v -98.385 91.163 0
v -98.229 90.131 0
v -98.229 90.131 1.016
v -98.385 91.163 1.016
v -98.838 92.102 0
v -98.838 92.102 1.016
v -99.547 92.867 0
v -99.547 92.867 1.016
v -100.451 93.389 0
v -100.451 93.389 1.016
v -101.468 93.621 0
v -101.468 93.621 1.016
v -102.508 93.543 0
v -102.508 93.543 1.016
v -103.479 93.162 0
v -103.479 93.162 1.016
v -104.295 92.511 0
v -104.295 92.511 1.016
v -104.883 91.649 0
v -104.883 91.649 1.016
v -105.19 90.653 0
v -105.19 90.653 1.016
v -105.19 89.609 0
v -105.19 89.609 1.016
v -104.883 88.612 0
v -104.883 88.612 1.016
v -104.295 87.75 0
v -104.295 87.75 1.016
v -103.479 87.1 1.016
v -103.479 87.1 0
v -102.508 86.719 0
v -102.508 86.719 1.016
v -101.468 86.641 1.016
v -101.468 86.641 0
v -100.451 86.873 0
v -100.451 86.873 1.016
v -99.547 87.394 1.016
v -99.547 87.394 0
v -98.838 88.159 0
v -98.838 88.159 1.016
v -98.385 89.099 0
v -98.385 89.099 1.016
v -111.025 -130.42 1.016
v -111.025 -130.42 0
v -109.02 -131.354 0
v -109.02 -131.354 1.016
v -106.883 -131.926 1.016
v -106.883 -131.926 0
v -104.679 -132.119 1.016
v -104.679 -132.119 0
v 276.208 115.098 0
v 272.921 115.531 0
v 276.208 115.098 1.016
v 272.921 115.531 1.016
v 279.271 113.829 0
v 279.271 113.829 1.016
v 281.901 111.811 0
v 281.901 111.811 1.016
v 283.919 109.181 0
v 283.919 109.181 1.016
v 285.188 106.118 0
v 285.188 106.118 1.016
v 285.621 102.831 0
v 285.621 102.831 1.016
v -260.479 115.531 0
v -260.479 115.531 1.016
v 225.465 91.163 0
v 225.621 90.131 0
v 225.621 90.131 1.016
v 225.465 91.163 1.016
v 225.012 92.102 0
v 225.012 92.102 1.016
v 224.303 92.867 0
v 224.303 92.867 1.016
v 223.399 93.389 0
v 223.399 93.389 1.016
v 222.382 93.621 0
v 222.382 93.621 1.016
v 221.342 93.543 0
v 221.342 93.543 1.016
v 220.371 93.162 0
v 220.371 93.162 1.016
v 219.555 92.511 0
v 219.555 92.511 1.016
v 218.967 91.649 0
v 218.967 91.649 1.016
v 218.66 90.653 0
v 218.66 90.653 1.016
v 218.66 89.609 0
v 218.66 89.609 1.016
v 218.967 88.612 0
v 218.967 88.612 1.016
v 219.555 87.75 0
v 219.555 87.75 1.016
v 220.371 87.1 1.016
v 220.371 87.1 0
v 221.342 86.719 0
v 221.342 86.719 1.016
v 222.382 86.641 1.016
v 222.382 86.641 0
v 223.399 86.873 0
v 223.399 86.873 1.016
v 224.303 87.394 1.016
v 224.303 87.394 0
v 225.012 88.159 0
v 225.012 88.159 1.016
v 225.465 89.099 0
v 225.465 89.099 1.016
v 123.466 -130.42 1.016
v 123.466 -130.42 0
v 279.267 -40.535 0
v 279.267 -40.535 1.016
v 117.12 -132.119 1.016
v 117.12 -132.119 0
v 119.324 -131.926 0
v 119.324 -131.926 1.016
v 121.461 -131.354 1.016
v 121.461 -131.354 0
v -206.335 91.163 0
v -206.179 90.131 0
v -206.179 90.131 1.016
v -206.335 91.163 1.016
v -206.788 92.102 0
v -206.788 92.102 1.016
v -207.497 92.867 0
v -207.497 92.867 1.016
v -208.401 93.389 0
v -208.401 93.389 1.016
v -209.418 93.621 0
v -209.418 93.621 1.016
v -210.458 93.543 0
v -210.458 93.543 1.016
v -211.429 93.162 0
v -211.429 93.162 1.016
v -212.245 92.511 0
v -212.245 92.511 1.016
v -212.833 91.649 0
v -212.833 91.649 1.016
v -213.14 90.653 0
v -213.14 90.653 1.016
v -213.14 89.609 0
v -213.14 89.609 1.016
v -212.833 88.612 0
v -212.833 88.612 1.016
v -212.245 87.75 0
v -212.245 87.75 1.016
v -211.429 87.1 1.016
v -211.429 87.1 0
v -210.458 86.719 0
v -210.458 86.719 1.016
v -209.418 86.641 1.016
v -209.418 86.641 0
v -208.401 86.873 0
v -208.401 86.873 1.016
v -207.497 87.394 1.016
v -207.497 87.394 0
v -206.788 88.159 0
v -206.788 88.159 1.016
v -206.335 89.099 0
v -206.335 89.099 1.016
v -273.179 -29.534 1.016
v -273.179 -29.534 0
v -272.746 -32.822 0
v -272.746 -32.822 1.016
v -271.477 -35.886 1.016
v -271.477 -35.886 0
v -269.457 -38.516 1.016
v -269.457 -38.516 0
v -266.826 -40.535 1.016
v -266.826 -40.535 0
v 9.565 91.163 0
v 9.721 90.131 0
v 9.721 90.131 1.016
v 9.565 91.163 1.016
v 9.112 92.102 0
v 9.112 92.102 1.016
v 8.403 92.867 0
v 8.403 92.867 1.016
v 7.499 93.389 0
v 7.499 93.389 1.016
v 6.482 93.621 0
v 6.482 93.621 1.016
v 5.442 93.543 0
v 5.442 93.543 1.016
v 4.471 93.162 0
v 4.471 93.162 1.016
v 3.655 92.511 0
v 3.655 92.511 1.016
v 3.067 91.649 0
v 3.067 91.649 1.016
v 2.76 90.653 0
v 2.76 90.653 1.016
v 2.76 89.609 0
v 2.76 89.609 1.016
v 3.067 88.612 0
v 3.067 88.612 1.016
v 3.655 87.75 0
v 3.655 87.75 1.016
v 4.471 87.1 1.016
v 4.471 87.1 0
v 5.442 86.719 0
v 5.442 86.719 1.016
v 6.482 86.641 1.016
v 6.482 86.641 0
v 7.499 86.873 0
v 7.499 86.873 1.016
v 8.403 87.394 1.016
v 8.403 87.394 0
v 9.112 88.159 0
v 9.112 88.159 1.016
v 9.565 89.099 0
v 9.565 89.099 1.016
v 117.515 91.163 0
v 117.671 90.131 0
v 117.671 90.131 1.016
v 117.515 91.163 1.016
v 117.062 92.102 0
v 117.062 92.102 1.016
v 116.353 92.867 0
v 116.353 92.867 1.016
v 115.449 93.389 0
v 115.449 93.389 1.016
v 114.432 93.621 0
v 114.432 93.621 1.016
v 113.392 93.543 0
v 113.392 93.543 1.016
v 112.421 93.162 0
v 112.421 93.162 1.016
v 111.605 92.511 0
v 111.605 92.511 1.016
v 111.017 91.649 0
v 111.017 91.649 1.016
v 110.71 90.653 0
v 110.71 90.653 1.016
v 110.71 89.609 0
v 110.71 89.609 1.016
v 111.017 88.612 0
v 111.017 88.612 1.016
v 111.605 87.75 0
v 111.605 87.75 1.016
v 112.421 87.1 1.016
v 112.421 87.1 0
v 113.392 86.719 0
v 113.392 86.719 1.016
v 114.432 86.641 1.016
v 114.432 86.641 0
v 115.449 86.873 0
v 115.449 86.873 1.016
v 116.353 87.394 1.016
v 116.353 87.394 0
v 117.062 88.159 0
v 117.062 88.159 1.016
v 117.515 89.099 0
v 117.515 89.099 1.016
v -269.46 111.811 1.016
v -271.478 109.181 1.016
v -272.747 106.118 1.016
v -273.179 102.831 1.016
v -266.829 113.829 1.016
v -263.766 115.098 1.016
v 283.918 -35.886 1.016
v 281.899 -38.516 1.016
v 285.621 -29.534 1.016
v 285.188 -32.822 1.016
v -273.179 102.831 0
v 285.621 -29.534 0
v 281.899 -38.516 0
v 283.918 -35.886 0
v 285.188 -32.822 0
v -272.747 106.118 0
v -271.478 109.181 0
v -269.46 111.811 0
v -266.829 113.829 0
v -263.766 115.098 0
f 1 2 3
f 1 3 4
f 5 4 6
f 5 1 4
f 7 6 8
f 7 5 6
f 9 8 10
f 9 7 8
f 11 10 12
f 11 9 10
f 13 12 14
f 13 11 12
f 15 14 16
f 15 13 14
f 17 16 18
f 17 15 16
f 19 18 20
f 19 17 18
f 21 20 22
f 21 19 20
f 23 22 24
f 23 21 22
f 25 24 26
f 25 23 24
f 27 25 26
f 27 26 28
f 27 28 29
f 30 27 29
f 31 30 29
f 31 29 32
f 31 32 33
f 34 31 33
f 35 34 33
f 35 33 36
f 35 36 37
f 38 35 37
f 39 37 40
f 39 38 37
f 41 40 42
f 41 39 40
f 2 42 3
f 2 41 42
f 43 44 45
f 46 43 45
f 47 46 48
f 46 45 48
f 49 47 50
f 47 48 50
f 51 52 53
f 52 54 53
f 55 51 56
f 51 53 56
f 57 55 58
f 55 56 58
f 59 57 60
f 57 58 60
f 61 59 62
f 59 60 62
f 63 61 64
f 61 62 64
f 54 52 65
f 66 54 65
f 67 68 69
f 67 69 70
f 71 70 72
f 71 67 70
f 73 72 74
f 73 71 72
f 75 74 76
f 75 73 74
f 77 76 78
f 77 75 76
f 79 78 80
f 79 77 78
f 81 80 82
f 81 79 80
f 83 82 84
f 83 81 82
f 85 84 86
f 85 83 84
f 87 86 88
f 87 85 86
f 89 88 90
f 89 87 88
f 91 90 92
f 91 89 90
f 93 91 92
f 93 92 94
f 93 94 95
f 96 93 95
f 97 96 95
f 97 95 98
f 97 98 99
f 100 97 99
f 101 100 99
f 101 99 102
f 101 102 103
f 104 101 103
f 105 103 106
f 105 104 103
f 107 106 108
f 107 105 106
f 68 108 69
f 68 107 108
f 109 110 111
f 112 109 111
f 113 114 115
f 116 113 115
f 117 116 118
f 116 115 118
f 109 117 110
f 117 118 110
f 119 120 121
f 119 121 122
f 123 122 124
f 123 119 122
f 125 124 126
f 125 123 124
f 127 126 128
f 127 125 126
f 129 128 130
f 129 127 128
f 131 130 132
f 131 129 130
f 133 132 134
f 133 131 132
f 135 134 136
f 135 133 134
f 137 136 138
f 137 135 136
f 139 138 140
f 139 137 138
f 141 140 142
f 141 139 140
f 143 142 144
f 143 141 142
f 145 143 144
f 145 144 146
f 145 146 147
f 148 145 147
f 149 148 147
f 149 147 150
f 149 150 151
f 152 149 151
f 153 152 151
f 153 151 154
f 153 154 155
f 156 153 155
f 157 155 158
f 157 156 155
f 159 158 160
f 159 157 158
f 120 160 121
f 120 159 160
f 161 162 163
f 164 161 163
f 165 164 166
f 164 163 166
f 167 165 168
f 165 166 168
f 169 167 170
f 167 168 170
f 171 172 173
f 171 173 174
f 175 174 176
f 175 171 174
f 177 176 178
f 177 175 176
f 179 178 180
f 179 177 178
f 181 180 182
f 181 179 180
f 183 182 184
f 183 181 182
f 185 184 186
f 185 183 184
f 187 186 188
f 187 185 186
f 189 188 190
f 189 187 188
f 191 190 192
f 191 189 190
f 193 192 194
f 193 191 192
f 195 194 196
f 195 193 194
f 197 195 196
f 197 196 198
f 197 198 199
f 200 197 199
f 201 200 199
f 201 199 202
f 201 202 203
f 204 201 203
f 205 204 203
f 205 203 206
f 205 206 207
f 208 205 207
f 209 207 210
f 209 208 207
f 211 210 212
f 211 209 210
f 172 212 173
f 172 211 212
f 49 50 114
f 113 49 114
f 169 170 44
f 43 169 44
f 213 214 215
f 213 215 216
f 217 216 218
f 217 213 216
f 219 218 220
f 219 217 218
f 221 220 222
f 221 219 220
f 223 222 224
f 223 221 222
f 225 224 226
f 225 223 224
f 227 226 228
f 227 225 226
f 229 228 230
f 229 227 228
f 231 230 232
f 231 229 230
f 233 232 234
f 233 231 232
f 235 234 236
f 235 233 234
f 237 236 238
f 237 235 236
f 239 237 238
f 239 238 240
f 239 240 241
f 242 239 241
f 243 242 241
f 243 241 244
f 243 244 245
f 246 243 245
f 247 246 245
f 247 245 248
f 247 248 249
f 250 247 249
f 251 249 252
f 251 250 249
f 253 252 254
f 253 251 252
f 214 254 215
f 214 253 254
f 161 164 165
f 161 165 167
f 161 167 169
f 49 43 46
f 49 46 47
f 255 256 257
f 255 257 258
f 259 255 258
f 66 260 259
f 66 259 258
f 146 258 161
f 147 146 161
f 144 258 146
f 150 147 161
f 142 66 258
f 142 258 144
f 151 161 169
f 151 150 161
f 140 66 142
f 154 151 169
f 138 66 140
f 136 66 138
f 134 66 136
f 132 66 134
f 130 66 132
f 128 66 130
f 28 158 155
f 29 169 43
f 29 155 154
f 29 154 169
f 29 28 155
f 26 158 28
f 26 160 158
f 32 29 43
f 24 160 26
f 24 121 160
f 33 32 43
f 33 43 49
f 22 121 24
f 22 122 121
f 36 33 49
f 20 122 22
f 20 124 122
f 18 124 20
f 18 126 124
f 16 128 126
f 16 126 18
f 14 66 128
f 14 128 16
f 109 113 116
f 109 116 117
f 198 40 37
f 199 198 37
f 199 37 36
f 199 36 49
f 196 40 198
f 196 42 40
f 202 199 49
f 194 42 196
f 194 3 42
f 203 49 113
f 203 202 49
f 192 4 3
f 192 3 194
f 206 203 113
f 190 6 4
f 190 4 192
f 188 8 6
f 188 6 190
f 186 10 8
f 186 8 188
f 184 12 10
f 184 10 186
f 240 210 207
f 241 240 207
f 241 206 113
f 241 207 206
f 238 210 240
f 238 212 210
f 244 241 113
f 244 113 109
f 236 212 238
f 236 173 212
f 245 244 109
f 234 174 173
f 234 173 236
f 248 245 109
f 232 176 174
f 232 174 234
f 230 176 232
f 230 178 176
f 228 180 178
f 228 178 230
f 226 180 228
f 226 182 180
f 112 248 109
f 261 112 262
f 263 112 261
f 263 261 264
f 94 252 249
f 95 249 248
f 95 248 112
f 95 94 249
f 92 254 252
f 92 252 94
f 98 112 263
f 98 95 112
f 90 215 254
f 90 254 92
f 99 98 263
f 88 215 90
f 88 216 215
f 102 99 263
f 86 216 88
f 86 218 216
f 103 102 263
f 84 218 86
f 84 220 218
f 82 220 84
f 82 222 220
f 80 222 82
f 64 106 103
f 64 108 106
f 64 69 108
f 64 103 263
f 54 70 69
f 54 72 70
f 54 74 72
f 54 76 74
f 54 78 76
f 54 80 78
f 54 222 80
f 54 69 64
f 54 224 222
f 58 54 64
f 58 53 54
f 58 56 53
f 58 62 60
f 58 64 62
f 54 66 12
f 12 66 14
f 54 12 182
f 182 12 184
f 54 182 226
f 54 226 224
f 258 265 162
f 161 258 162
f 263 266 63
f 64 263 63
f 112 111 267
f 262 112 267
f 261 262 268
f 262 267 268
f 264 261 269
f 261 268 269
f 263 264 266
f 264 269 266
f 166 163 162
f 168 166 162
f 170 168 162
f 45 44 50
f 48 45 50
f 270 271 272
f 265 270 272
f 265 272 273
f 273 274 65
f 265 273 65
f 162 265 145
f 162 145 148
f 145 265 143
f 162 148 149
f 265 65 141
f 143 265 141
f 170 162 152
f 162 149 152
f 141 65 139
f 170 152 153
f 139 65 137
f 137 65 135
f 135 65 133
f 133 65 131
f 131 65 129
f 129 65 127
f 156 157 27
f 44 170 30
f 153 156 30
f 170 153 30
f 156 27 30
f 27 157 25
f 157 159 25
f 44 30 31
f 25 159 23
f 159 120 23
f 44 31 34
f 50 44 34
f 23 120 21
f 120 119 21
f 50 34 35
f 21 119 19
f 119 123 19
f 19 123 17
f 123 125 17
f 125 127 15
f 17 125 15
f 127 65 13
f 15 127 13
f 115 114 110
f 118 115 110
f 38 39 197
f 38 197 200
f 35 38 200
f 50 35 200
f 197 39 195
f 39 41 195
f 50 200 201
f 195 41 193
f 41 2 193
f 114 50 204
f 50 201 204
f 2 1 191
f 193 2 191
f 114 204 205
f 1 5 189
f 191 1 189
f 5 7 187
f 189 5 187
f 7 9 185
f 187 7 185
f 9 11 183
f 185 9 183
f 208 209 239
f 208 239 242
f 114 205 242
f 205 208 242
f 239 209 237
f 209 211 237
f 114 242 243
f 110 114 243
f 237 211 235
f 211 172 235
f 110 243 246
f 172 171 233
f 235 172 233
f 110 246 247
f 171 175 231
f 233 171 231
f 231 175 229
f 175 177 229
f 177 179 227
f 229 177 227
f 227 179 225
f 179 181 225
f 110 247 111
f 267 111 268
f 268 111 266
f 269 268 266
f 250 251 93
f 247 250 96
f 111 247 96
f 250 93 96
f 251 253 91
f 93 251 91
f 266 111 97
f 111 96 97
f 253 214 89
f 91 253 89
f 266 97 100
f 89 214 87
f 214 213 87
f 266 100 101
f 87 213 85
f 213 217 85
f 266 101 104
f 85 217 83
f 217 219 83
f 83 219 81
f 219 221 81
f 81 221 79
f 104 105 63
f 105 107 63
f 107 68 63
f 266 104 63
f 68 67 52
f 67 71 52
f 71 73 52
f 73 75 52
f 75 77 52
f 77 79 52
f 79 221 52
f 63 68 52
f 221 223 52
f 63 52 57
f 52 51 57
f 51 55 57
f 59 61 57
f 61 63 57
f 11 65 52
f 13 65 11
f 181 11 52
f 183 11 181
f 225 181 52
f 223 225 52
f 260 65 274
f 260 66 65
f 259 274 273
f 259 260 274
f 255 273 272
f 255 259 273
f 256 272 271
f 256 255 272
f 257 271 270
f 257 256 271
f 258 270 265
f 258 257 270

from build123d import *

# Parameters (mm, degrees)
SKETCH2_R           = 3.5
BOSS_EXTRUDE1_DEPTH = 1.016
FILLET1_R           = 12.7


with BuildPart() as part:
    # Sketch2 → Boss-Extrude1 (new body)
    with BuildSketch(Plane.XY):
        with BuildLine():
            Line((285.620600763, 115.53086565), (-273.179399237, 115.53086565))
            Line((-273.179399237, 115.53086565), (-273.179399237, -29.534072508))
            ThreePointArc((-273.179399237, -29.534072508), (-271.476904285, -35.885834684), (-266.825874397, -40.534629451))
            Line((-266.825874397, -40.534629451), (-111.025100537, -130.419691293))
            ThreePointArc((-111.025100537, -130.419691293), (-107.963661665, -131.686918852), (-104.678625377, -132.11913435))
            Line((-104.678625377, -132.11913435), (6.220600763, -132.11913435))
            Line((6.220600763, -132.11913435), (117.119826902, -132.11913435))
            ThreePointArc((117.119826902, -132.11913435), (120.40486319, -131.686918852), (123.466302062, -130.419691293))
            Line((123.466302062, -130.419691293), (279.267075922, -40.534629451))
            ThreePointArc((279.267075922, -40.534629451), (283.91810581, -35.885834684), (285.620600763, -29.534072508))
            Line((285.620600763, -29.534072508), (285.620600763, 115.53086565))
        make_face()
        with Locations((-209.679399237, 90.13086565)):
            Circle(SKETCH2_R, mode=Mode.SUBTRACT)
        with Locations((-101.729399237, 90.13086565)):
            Circle(SKETCH2_R, mode=Mode.SUBTRACT)
        with Locations((6.220600763, 90.13086565)):
            Circle(SKETCH2_R, mode=Mode.SUBTRACT)
        with Locations((114.170600763, 90.13086565)):
            Circle(SKETCH2_R, mode=Mode.SUBTRACT)
        with Locations((222.120600763, 90.13086565)):
            Circle(SKETCH2_R, mode=Mode.SUBTRACT)
    extrude(amount=BOSS_EXTRUDE1_DEPTH)

    # Fillet1
    fillet1_edges = [part.edges().sort_by_distance(p)[0] for p in [
        (-273.179399237, 115.53086565, 0.508),
        (285.620600763, 115.53086565, 0.508),
    ]]
    fillet(fillet1_edges, radius=FILLET1_R)


solid = part.part
